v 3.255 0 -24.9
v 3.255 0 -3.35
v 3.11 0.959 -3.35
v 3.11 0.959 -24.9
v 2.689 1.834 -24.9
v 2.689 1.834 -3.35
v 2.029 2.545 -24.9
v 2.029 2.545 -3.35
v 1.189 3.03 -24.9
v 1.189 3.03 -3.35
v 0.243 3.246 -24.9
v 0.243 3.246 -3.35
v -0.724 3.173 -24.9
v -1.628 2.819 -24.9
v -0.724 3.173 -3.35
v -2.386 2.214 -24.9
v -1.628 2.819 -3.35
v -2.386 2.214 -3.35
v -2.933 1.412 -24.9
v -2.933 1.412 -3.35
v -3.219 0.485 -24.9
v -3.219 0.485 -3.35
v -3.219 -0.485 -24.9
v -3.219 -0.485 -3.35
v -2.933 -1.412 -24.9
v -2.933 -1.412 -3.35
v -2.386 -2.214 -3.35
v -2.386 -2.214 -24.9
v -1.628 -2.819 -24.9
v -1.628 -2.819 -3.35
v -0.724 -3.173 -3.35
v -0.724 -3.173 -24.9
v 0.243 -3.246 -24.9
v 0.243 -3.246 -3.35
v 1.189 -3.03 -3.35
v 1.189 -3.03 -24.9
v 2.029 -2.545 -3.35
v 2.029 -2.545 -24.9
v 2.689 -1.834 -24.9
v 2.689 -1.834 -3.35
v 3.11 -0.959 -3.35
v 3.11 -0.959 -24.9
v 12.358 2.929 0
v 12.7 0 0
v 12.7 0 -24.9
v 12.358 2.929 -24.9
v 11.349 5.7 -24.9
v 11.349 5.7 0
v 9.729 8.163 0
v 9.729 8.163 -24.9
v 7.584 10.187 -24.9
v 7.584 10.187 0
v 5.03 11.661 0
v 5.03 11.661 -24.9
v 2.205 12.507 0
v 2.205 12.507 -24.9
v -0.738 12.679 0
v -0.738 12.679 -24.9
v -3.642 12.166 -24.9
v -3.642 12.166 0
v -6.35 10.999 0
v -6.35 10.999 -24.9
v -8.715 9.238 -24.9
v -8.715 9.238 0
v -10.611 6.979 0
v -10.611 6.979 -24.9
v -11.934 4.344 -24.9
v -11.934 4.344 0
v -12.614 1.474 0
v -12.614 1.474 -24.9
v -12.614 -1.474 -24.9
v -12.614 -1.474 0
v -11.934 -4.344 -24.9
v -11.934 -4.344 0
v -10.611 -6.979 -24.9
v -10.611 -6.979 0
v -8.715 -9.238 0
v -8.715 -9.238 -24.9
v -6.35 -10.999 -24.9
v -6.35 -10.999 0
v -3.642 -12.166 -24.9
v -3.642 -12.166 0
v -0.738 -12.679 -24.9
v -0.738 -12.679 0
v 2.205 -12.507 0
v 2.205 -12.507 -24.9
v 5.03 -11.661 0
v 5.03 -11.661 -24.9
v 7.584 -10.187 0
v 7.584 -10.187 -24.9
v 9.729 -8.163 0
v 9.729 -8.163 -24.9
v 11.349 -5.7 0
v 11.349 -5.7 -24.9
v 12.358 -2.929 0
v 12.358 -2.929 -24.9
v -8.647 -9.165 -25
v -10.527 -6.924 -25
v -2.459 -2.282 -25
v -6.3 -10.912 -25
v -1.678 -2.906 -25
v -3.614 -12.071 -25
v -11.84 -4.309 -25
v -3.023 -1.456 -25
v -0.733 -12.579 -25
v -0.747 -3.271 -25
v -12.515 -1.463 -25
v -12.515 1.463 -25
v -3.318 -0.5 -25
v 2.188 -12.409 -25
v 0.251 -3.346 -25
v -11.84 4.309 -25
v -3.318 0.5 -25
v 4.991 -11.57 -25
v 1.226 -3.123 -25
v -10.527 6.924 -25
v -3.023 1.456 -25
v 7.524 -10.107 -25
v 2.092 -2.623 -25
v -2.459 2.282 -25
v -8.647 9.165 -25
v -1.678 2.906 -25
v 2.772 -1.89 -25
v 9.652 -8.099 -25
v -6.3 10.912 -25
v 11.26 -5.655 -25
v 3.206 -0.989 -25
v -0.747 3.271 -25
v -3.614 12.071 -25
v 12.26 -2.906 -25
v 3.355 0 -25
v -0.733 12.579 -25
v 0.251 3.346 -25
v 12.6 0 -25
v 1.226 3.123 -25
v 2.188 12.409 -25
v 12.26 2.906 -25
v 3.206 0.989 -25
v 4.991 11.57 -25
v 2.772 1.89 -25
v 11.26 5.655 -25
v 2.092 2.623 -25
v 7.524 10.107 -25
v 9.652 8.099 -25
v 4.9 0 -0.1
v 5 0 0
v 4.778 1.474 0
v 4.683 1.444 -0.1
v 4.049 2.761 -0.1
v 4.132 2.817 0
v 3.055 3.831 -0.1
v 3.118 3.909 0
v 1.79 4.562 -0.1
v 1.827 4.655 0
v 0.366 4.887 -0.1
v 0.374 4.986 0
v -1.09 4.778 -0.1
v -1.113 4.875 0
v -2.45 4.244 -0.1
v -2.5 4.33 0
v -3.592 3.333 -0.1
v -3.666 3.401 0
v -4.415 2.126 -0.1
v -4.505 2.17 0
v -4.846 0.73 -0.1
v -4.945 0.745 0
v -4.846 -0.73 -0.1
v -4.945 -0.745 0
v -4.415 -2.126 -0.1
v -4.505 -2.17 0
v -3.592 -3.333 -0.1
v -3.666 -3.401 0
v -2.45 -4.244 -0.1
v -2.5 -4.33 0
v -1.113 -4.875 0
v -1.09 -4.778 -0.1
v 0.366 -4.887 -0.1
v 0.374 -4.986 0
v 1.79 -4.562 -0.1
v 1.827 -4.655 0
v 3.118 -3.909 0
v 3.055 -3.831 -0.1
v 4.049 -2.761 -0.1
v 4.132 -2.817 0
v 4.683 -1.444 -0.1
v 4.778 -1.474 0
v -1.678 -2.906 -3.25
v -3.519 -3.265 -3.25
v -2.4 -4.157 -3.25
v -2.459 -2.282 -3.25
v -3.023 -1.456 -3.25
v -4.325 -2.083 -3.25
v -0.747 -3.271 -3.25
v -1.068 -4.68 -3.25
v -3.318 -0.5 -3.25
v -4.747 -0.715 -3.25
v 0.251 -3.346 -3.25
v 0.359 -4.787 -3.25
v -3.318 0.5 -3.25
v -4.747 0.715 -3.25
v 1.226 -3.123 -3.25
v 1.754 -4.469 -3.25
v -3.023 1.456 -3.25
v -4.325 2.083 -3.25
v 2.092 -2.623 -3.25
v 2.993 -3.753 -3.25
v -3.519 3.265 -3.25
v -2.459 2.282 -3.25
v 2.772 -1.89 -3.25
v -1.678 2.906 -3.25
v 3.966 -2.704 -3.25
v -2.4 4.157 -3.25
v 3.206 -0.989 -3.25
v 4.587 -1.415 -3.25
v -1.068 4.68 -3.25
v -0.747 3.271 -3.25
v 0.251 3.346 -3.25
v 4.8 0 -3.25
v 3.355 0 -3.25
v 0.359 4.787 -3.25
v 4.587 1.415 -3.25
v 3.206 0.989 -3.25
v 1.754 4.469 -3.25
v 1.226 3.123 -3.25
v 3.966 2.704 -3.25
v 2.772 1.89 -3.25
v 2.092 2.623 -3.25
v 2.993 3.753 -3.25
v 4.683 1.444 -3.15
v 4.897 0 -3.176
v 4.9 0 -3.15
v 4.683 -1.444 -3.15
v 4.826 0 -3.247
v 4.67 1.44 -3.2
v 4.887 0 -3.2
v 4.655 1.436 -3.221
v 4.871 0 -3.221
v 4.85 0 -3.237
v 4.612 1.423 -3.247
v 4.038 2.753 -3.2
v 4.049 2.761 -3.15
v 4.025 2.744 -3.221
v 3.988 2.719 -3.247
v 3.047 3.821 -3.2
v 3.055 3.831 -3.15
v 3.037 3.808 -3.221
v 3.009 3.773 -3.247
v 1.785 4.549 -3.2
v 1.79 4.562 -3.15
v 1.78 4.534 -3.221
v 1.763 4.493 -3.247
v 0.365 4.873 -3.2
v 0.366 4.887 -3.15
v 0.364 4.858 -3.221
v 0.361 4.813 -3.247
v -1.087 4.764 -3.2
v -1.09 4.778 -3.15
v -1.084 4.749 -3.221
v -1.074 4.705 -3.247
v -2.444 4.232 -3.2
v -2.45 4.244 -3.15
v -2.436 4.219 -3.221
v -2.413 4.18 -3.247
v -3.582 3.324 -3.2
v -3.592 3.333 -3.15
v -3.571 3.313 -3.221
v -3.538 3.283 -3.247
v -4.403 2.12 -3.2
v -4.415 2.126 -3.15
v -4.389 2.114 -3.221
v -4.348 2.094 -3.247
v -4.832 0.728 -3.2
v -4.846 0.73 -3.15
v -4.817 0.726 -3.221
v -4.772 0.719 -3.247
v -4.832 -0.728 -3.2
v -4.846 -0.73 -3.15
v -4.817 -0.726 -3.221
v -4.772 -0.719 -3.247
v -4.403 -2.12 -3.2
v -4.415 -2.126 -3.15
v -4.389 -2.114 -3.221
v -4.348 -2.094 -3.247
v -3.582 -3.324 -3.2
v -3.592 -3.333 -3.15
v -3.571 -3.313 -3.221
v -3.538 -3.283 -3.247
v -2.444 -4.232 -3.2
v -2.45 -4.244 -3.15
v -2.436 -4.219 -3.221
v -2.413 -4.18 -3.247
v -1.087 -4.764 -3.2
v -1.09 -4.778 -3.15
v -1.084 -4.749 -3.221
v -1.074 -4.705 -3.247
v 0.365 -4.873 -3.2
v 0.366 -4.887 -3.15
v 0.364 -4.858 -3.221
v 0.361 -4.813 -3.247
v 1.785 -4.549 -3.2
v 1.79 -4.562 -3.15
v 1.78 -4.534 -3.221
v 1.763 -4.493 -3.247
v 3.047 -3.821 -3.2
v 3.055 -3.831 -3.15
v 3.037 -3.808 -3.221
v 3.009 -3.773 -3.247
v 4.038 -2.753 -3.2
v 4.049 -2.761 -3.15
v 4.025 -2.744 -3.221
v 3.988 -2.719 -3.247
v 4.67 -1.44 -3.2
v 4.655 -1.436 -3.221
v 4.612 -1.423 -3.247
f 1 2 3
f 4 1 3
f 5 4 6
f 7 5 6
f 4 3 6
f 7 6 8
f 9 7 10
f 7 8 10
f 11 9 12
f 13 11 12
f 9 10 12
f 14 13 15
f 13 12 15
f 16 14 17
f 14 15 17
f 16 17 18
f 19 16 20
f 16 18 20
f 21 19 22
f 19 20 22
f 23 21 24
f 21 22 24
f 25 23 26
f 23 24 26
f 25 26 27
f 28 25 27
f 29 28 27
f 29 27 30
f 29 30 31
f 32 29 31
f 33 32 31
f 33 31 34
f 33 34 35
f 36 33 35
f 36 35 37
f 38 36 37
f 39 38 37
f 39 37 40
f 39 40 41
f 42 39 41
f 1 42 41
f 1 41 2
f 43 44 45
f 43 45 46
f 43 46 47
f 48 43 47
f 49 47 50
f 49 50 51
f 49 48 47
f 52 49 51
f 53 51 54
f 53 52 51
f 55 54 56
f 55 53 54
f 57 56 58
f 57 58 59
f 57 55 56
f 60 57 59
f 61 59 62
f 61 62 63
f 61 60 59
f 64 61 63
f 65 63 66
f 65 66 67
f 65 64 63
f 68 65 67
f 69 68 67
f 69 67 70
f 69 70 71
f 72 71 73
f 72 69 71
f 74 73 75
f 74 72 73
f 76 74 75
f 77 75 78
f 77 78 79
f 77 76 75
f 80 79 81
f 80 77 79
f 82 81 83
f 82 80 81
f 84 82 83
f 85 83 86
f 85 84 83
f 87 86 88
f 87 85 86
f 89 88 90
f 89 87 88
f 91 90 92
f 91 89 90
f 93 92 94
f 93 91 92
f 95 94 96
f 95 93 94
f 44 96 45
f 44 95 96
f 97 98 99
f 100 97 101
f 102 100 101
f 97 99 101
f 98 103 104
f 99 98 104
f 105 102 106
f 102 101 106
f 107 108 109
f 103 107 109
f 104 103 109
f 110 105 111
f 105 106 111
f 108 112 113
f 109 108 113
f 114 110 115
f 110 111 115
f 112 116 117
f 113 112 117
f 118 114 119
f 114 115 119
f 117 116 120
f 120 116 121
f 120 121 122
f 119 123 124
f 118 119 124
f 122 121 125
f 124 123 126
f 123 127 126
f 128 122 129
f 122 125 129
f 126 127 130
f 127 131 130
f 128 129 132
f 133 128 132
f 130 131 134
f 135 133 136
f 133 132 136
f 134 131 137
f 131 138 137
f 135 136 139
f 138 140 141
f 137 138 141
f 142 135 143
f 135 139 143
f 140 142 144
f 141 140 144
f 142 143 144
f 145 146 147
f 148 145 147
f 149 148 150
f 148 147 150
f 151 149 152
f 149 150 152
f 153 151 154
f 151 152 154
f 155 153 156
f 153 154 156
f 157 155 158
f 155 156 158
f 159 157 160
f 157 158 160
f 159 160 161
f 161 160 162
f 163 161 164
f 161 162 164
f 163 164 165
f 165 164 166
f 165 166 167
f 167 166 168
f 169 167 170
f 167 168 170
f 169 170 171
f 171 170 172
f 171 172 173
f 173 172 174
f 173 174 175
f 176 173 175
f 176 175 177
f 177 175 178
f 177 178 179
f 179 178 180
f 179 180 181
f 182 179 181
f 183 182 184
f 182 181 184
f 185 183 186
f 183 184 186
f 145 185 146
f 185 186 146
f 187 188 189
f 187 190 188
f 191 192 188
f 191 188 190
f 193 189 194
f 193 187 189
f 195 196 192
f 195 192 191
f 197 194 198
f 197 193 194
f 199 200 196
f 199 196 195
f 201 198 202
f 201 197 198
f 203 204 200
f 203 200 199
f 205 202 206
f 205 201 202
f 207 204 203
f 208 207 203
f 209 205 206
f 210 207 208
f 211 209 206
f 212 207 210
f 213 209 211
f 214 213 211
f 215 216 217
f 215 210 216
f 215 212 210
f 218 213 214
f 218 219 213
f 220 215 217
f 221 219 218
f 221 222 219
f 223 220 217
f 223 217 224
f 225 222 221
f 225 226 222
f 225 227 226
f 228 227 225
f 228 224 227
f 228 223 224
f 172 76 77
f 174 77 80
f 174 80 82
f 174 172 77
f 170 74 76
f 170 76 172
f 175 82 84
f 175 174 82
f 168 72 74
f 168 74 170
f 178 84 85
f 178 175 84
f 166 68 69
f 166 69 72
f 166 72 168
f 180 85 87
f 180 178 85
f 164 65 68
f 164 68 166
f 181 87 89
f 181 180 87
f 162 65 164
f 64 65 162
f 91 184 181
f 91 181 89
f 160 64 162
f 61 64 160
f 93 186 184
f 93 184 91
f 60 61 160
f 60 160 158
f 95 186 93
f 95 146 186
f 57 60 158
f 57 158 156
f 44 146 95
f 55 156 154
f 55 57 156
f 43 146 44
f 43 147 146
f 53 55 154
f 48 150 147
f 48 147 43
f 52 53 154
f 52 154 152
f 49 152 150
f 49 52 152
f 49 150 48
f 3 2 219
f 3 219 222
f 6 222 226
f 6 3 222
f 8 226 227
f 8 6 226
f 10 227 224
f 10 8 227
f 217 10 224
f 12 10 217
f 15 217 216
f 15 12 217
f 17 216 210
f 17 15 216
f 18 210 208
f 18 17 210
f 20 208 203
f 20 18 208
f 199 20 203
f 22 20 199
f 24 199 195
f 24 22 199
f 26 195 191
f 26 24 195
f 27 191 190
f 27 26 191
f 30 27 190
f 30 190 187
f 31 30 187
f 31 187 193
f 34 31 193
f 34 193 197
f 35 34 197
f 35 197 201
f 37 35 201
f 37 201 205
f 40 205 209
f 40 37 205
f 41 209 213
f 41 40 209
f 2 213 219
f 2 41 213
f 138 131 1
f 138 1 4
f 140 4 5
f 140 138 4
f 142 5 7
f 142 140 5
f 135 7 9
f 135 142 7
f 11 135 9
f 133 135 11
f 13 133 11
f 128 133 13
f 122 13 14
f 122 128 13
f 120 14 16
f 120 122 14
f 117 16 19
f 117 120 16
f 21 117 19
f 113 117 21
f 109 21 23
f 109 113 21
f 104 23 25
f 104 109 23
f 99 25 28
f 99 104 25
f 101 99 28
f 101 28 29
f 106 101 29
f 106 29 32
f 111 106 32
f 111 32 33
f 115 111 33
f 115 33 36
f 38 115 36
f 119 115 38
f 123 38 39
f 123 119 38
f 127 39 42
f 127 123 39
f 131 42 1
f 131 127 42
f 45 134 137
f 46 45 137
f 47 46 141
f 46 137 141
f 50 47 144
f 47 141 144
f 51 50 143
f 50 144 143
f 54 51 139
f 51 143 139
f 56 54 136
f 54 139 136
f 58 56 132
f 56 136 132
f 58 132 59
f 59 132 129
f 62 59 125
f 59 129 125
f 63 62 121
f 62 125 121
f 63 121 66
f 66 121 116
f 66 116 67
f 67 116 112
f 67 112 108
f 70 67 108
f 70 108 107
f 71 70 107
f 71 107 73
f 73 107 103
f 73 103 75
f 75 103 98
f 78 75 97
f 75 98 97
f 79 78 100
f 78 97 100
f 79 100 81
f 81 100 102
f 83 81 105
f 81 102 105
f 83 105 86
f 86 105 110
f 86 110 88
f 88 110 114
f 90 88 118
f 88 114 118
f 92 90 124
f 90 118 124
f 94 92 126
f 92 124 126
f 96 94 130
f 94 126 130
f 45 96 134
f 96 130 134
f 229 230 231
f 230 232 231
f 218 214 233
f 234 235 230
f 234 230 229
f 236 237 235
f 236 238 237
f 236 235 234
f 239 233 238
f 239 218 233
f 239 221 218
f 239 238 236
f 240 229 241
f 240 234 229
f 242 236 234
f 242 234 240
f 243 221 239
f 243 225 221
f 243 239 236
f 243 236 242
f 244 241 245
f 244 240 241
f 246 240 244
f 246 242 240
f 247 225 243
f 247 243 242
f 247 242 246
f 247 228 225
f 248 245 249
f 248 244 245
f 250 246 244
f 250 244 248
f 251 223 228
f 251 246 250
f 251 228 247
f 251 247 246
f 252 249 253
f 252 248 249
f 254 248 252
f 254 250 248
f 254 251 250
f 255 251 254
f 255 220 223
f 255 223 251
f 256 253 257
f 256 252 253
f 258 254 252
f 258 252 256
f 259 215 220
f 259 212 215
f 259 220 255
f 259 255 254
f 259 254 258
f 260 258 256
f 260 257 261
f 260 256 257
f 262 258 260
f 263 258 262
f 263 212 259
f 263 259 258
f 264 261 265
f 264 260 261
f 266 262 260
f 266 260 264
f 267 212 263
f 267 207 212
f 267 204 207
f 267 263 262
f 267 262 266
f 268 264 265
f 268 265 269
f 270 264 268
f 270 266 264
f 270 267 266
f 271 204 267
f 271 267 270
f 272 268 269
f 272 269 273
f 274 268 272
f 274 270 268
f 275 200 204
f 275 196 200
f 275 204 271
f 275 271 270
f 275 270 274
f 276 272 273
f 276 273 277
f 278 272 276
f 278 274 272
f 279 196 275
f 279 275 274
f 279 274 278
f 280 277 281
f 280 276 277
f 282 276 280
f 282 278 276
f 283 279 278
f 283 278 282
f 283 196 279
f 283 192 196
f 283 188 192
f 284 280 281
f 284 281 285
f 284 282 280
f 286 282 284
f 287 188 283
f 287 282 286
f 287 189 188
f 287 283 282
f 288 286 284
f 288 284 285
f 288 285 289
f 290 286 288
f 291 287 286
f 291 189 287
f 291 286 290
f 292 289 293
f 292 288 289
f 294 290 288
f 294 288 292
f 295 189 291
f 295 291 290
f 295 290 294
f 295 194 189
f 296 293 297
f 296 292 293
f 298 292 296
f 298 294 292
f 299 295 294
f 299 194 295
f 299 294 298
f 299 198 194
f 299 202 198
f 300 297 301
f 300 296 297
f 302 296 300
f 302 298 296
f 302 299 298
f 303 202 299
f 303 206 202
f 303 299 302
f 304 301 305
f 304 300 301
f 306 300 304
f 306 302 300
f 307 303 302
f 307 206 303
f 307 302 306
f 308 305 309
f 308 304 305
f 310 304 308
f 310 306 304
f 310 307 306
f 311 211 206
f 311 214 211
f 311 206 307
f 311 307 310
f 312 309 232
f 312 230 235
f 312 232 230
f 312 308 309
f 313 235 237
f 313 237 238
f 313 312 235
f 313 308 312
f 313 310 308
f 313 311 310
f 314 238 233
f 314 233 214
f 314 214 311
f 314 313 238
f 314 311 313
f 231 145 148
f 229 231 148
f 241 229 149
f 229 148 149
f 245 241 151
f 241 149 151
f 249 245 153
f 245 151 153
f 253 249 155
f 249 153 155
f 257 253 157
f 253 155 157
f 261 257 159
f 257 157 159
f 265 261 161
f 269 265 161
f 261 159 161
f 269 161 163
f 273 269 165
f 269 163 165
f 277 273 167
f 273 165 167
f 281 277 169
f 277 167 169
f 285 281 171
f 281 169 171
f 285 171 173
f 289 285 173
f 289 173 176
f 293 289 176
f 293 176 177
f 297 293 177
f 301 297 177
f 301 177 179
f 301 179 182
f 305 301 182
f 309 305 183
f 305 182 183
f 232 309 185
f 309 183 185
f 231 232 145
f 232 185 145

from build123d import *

# Parameters (mm, degrees)
F0_R     = 12.7
F0_R_2   = 3.255
F1_DEPTH = 25
F2_R     = 4.900418
F3_DEPTH = 3.25
F4_R     = 0.1
F5_SIZE  = 0.1


with BuildPart() as f1:
    # F0 (on Top) → F1 (new body)
    with BuildSketch(Plane.XY):
        Circle(F0_R)
        Circle(F0_R_2, mode=Mode.SUBTRACT)
    extrude(amount=-F1_DEPTH)

    # F2 (on face) → F3 (cut)
    with BuildSketch(Plane.XY):
        Circle(F2_R)
    extrude(amount=-F3_DEPTH, mode=Mode.SUBTRACT)

    # F4
    f4_edges = [f1.edges().sort_by_distance(p)[0] for p in [
        (-4.900418, 0, -3.25),
    ]]
    fillet(f4_edges, radius=F4_R)

    # F5
    f5_edges = [f1.edges().sort_by_distance(p)[0] for p in [
        (-3.255, 0, -3.25),
        (-4.900418, 0, 0),
        (-3.255, 0, -25),
        (-12.7, 0, -25),
    ]]
    chamfer(f5_edges, length=F5_SIZE)


solid = f1.part
